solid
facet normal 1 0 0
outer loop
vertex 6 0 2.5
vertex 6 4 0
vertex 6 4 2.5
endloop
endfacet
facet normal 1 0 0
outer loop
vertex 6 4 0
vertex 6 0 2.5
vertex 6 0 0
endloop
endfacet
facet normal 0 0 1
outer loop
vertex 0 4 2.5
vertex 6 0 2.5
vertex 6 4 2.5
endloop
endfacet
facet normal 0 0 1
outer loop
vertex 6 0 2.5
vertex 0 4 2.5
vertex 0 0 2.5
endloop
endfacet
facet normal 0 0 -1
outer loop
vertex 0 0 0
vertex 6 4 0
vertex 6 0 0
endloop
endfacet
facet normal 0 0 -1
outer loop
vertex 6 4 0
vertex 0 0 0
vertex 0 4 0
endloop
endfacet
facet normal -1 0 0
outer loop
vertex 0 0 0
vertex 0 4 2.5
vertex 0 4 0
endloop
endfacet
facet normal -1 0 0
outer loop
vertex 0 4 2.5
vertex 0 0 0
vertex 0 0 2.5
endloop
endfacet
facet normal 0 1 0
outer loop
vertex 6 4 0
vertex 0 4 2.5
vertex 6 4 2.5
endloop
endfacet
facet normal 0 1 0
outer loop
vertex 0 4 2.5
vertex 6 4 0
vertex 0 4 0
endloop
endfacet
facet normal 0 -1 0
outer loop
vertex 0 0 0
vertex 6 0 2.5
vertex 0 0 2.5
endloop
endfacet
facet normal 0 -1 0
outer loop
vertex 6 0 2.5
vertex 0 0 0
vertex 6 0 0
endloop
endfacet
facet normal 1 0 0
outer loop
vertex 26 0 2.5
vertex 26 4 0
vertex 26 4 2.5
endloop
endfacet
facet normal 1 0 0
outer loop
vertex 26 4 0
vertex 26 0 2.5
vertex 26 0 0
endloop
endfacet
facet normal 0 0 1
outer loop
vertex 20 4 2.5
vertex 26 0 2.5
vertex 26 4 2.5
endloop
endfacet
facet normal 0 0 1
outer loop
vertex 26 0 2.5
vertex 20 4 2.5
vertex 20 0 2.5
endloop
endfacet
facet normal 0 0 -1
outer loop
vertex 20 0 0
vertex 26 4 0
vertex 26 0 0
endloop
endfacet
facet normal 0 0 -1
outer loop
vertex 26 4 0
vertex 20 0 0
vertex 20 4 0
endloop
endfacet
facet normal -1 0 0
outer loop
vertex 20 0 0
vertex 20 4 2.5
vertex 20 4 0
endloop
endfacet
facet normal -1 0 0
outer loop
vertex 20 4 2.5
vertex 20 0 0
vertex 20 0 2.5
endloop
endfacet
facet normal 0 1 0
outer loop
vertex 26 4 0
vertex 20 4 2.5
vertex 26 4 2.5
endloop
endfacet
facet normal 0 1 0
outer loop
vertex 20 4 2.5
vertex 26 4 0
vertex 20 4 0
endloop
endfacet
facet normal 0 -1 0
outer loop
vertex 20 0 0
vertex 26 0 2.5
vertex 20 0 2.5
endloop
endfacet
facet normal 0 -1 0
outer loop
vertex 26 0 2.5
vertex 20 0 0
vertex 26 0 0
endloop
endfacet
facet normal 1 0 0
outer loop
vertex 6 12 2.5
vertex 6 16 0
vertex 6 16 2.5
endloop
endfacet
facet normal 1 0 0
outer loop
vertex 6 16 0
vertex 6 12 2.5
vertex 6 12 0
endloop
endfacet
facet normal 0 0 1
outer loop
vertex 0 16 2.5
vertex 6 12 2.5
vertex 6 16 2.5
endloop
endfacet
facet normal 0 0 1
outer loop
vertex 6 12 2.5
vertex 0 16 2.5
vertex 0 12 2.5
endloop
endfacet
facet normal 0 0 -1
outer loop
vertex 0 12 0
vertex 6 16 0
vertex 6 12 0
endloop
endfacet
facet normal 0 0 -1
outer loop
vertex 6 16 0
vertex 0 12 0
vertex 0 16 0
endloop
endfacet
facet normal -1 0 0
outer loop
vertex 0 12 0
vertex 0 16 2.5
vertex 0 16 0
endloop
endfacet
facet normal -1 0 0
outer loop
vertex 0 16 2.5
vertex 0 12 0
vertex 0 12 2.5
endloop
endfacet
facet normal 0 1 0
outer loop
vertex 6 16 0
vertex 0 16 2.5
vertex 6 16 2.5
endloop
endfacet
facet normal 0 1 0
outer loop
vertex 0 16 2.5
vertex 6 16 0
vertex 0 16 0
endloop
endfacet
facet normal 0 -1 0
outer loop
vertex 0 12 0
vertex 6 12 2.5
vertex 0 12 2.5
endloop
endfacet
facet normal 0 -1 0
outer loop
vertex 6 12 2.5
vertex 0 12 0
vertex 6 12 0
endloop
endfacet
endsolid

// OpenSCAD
// List values for the browser tests (planned item 10): which lists become fields, and how.

/* [Lists] */
// corner posts, x and y
posts = [[0, 0], [20, 0], [0, 12]];
labels = ["PWR", "LNK"];
size = [6, 4, 2.5];          // [1:0.5:30]
five = [1, 2, 3, 4, 5];      // [a, b]
// a table over several lines
table = [
    [2, 3, "a"],   // first row
    // a comment line inside
    [4, 5, "b;c // d"]
];
note = "semi; colon // not a comment";

/* [Hidden] */
secret = [1, 2];

/* [Calculated] */
moved = [size[0] + 1, 2];
spread = [for (i = [0:2]) i * 2];

module post(p) { translate([p[0], p[1], 0]) cube(size); }
for (p = posts) post(p);
